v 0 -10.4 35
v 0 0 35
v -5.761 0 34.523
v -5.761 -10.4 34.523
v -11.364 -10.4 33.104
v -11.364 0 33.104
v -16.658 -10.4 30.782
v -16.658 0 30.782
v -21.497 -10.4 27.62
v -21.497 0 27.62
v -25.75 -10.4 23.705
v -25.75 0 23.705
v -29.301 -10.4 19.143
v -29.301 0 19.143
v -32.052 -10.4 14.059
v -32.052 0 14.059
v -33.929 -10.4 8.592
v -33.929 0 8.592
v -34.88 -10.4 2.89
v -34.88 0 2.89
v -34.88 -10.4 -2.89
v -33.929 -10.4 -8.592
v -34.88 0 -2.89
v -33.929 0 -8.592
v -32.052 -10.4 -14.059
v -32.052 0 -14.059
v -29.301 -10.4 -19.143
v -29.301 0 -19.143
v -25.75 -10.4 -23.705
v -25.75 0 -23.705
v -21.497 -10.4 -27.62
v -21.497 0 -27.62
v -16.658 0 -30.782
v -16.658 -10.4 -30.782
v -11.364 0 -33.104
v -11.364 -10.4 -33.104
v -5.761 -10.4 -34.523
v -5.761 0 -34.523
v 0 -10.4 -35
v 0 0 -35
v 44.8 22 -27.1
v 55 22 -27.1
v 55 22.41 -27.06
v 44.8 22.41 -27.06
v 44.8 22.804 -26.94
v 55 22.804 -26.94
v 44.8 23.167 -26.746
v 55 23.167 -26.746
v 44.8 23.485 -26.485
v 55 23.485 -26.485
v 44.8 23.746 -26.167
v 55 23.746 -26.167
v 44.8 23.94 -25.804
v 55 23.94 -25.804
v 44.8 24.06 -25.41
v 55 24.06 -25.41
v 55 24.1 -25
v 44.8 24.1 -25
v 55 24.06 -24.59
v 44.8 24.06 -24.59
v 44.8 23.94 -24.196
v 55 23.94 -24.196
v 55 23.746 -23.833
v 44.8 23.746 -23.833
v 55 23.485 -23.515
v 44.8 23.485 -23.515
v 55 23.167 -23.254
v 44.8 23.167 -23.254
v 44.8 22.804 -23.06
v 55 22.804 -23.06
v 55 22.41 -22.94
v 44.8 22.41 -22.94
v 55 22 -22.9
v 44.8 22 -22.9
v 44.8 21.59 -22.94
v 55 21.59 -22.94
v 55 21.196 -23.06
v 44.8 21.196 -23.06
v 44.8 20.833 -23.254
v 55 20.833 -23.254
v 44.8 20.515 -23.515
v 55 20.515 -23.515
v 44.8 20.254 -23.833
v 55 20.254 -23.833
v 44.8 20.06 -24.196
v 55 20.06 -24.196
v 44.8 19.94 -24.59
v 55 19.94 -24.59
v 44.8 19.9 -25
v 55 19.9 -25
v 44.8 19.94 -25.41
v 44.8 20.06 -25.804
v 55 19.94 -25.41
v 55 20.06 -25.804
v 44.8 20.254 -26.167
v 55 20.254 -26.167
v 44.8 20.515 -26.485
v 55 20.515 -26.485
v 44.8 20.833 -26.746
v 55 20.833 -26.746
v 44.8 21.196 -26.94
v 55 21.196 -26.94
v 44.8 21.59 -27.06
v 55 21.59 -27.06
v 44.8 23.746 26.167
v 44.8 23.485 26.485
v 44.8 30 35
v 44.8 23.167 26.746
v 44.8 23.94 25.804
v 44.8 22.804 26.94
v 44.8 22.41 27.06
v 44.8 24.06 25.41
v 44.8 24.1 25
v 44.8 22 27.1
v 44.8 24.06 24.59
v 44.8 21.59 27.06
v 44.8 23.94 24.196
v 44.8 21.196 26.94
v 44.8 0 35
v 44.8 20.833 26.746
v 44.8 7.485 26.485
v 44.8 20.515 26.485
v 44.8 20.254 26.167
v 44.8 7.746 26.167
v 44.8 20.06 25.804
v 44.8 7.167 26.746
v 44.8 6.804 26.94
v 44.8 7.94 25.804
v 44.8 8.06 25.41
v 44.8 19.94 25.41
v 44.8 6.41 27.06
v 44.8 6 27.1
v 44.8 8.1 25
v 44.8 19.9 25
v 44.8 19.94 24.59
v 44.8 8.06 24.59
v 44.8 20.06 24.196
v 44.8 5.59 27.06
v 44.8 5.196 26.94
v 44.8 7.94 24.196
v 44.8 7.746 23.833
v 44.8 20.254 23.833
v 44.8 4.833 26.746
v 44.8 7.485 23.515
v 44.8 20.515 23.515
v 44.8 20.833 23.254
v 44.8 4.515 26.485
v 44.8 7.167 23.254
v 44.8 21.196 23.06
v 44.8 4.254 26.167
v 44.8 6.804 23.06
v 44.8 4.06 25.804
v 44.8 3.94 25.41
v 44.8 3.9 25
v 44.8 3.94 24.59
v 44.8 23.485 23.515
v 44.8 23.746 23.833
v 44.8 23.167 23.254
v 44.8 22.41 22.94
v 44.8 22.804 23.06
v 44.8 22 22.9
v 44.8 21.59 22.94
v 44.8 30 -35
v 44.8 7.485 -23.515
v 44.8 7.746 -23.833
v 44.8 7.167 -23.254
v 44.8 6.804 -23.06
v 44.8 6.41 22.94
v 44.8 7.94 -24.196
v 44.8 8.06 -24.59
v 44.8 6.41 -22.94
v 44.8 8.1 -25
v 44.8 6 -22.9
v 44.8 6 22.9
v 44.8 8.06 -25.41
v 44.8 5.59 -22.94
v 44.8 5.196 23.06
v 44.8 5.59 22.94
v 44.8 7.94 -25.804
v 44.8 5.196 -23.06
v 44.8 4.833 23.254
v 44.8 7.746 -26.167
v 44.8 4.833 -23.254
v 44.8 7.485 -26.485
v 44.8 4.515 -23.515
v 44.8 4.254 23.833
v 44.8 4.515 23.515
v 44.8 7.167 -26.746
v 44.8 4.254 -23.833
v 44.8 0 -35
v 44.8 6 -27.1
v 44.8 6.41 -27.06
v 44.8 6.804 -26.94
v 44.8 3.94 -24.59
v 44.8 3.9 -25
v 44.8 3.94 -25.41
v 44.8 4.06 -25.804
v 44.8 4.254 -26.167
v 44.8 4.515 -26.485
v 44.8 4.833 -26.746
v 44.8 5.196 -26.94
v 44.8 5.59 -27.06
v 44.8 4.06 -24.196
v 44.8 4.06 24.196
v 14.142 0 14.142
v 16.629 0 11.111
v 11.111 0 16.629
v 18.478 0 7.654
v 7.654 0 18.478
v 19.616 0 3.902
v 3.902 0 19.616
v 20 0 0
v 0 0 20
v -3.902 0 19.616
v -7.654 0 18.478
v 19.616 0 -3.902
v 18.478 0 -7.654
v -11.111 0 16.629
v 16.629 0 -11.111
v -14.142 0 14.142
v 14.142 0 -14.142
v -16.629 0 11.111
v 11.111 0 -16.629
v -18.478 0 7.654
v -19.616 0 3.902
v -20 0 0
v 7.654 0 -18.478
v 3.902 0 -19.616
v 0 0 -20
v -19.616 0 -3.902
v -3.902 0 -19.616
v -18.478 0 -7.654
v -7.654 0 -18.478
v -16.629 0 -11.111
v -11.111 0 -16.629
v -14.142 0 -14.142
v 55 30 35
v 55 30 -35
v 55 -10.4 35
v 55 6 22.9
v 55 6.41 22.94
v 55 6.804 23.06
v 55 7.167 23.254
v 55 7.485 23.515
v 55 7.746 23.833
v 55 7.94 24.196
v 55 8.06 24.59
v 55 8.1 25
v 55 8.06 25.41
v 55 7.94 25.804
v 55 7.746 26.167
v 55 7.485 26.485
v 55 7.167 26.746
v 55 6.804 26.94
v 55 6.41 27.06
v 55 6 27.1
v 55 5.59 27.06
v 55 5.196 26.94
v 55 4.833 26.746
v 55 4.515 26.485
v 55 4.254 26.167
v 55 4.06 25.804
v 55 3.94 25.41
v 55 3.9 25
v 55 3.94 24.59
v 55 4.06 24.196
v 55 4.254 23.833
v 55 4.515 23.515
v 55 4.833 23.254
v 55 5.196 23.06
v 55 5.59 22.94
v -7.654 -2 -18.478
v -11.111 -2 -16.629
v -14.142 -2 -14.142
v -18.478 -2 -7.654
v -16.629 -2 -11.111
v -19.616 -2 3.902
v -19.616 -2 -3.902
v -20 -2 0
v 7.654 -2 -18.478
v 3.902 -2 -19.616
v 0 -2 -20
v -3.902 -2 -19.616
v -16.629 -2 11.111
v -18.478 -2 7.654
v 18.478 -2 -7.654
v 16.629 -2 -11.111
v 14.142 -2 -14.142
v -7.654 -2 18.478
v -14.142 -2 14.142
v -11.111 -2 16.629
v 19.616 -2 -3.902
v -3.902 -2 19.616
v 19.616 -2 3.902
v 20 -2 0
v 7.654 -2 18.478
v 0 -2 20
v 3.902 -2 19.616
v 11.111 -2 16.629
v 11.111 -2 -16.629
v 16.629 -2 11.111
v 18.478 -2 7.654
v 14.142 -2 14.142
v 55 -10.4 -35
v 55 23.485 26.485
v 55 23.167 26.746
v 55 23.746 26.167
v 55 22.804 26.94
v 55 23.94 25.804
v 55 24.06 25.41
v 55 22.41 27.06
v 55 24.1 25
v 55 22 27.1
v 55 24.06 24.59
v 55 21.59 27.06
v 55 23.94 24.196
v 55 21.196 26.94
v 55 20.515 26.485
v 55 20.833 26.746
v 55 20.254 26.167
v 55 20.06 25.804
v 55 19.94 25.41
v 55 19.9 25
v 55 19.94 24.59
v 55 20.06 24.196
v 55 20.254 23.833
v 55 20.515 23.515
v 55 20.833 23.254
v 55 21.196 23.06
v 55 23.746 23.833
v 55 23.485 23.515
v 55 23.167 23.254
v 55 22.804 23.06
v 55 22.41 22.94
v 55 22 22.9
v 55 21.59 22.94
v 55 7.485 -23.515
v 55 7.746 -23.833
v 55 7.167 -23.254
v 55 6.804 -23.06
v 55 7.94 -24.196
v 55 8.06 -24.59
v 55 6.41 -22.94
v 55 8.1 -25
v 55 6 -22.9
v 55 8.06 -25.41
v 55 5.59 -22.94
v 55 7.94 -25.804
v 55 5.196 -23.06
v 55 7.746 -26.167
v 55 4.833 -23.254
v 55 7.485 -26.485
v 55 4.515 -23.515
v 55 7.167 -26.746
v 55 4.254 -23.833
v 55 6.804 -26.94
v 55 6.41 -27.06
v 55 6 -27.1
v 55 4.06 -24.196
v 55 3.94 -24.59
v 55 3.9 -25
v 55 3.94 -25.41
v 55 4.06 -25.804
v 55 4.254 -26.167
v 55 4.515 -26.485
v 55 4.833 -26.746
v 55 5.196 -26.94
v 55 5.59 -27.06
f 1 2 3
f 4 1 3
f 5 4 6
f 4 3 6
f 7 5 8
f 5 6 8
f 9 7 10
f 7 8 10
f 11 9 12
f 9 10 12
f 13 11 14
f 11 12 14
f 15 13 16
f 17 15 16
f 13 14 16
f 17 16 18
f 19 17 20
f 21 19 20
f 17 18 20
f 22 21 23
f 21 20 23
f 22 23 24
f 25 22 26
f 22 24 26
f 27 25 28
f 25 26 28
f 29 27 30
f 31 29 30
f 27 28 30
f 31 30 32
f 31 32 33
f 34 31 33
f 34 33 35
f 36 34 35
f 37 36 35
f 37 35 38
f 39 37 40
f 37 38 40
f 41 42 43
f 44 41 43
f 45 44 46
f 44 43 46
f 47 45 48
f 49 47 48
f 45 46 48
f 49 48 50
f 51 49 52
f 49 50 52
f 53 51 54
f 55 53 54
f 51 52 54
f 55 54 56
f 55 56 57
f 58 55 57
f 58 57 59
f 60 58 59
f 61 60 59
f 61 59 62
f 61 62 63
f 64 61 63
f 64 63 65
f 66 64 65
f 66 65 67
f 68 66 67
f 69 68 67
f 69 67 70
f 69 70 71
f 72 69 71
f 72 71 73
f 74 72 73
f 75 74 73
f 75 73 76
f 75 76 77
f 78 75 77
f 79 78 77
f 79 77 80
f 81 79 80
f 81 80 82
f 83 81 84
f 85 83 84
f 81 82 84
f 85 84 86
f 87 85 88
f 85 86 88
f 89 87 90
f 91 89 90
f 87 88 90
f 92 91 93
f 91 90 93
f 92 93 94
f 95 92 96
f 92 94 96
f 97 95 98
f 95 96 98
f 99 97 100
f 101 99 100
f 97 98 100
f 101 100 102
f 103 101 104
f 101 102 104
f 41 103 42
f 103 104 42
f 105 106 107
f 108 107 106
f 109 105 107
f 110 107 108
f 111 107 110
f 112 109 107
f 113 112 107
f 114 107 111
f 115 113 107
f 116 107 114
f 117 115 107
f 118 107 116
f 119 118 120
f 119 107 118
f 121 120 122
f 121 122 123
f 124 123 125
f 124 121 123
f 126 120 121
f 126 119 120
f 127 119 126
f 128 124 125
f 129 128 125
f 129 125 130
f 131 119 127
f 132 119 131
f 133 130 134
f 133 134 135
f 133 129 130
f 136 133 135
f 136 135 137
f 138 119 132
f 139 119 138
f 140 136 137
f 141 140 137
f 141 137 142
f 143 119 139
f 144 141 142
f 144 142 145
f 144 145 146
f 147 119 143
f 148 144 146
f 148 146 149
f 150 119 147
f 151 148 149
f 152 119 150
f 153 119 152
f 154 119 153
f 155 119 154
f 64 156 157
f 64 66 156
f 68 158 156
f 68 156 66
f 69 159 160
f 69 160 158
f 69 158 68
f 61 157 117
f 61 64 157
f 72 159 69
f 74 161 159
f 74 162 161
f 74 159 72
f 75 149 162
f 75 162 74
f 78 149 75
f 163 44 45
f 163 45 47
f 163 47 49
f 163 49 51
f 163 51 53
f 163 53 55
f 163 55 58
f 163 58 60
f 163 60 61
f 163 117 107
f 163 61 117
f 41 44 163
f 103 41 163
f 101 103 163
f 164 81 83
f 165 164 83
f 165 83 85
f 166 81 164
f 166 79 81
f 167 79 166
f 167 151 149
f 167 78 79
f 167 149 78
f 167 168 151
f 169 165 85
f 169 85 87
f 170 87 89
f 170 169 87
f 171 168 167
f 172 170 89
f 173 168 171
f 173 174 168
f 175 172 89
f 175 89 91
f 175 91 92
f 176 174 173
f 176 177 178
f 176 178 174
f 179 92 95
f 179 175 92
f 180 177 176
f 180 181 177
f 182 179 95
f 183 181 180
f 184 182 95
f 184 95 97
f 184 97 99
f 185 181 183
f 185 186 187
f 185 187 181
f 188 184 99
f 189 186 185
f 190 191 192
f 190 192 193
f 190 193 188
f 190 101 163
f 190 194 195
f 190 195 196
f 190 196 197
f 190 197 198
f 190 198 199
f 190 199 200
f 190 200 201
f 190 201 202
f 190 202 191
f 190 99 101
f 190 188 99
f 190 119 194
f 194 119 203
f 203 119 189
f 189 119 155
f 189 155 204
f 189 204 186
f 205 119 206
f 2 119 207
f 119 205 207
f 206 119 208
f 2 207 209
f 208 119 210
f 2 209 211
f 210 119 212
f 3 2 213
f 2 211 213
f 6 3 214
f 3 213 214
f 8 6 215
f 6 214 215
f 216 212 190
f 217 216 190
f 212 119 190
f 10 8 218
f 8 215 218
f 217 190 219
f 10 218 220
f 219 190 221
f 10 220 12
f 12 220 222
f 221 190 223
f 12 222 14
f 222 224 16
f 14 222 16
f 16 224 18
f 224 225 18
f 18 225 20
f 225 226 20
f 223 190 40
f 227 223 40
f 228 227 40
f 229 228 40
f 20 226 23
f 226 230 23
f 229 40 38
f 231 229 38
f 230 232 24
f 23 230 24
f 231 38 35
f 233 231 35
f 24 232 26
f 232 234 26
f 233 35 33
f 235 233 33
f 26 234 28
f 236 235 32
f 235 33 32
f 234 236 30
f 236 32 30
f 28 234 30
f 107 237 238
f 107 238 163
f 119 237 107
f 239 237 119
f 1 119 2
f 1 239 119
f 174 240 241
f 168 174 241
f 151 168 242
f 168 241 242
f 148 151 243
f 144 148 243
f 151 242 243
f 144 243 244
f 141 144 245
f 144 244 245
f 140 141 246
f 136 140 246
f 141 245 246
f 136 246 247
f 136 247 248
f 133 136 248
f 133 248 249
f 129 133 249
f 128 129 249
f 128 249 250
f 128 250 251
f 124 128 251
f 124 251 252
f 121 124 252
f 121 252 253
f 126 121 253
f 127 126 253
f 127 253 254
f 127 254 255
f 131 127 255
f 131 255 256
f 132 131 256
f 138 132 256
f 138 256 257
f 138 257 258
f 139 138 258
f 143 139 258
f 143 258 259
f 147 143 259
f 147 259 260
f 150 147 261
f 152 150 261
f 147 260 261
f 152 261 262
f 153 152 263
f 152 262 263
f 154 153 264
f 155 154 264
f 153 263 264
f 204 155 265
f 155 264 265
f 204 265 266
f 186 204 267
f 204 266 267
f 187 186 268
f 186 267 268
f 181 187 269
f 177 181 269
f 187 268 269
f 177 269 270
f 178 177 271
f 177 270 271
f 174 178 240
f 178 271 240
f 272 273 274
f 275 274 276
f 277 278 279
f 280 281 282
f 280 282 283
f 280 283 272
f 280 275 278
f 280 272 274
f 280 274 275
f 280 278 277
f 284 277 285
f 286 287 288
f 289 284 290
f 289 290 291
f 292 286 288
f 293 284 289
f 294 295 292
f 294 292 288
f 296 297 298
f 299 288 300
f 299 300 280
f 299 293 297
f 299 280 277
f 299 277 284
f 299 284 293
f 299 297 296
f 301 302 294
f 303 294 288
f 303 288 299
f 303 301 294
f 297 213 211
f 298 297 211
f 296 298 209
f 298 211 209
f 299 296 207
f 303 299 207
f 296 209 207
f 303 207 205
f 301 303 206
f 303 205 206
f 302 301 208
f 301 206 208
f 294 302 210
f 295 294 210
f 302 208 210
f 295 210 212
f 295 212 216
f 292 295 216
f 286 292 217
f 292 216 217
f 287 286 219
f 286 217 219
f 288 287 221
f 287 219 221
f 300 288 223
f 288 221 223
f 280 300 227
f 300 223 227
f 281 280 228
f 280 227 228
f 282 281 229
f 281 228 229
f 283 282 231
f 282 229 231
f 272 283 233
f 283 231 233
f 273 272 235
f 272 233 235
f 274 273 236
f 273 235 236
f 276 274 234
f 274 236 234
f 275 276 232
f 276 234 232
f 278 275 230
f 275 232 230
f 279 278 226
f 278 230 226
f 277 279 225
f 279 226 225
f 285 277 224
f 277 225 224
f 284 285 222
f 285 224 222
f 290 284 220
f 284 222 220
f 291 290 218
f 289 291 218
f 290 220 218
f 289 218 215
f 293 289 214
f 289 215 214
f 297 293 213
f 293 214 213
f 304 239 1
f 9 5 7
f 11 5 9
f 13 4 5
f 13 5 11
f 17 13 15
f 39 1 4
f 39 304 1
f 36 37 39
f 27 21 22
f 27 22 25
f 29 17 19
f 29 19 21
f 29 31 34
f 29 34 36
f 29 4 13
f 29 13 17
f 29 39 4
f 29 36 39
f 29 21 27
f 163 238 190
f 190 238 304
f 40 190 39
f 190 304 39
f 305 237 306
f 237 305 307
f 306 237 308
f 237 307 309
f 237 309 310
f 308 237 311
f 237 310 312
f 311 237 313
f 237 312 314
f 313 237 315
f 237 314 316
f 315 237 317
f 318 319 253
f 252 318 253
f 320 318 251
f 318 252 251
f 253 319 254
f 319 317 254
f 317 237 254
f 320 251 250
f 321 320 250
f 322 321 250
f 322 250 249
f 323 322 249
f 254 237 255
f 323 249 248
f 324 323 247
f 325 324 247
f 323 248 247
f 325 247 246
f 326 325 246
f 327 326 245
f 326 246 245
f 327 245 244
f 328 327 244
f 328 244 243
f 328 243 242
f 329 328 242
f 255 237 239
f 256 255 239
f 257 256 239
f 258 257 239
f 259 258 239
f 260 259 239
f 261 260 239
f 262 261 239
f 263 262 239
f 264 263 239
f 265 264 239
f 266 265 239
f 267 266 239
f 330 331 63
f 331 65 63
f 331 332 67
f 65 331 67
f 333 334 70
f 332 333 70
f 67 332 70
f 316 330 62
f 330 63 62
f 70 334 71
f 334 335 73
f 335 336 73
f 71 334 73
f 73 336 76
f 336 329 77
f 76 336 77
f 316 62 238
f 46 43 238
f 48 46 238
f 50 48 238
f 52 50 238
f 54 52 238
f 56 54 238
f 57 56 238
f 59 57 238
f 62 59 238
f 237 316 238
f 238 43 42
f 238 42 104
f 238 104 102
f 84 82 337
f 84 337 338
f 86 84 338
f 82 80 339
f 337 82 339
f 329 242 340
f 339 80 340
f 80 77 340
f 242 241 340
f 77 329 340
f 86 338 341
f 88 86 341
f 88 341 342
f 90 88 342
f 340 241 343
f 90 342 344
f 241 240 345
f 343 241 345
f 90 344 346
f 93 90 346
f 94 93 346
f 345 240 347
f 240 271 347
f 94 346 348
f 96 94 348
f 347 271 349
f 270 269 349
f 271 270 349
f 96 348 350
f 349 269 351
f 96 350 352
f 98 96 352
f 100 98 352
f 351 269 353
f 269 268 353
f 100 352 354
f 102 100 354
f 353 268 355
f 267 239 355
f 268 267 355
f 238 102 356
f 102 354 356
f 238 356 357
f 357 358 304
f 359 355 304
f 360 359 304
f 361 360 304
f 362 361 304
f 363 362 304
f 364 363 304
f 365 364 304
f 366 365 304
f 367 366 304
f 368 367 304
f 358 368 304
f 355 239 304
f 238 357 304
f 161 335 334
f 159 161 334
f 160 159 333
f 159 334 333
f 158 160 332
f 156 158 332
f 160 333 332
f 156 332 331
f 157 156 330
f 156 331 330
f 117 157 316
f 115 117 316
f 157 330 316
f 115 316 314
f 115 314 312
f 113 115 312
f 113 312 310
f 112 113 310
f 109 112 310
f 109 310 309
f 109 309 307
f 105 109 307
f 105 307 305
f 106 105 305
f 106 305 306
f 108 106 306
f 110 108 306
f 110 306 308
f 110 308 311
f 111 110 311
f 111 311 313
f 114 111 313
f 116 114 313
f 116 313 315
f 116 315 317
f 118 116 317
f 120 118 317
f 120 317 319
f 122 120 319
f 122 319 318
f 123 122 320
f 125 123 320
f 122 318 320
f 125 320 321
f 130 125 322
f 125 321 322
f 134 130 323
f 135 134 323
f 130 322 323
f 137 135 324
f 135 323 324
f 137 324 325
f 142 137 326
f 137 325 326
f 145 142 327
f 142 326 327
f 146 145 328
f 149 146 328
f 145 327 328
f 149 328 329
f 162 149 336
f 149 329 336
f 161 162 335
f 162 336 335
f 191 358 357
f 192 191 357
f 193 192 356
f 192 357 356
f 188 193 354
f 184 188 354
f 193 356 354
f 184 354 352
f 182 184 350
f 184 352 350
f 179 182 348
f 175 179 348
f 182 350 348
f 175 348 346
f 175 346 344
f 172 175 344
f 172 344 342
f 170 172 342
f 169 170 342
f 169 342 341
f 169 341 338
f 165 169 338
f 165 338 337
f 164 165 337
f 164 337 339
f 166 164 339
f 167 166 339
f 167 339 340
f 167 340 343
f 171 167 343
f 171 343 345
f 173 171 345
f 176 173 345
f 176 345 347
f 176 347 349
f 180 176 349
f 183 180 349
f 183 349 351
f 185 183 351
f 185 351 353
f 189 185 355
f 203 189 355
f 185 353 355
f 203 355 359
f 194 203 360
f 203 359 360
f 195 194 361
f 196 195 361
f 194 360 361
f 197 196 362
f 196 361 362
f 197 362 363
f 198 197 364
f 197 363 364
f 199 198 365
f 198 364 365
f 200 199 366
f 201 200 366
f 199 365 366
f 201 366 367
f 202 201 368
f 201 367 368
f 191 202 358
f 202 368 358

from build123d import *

# Parameters (mm, degrees)
EXTRUDE_1_DEPTH     = 10.4
SKETCH_2_W          = 10.2
SKETCH_2_H          = 70
EXTRUDE_2_DEPTH     = 30
SKETCH_3_R          = 2.1
CUT_EXTRUDE_3_DEPTH = 102.118742081
SKETCH_4_R          = 20
CUT_EXTRUDE_4_DEPTH = 2


with BuildPart() as part:
    # ｽｹｯﾁ1 → 押し出し1 (new body)
    with BuildSketch(Plane(origin=(0, 0, 0), x_dir=(1, 0, 0), z_dir=(0, 1, 0))):
        with BuildLine():
            Line((0, 35), (55, 35))
            Line((55, 35), (55, -35))
            Line((55, -35), (0, -35))
            ThreePointArc((0, -35), (-35, 0), (0, 35))
        make_face()
    extrude(amount=-EXTRUDE_1_DEPTH)

    # ｽｹｯﾁ2 → 押し出し2 (add)
    with BuildSketch(Plane(origin=(0, 0, 0), x_dir=(-1, 0, 0), z_dir=(0, -1, 0))):
        with Locations((-49.9, 0)):
            Rectangle(SKETCH_2_W, SKETCH_2_H)
    extrude(amount=-EXTRUDE_2_DEPTH)

    # ｽｹｯﾁ3 → 押し出し3 (cut, through all)
    with BuildSketch(Plane(origin=(55, 0, 0), x_dir=(0, 0, -1), z_dir=(1, 0, 0))):
        with Locations((25, 22)):
            Circle(SKETCH_3_R)
        with Locations((25, 6)):
            Circle(SKETCH_3_R)
        with Locations((-25, 6)):
            Circle(SKETCH_3_R)
        with Locations((-25, 22)):
            Circle(SKETCH_3_R)
    extrude(amount=-CUT_EXTRUDE_3_DEPTH, mode=Mode.SUBTRACT)

    # ｽｹｯﾁ4 → 押し出し4 (cut)
    with BuildSketch(Plane(origin=(0, 0, 0), x_dir=(1, 0, 0), z_dir=(0, 1, 0))):
        Circle(SKETCH_4_R)
    extrude(amount=-CUT_EXTRUDE_4_DEPTH, mode=Mode.SUBTRACT)


solid = part.part
